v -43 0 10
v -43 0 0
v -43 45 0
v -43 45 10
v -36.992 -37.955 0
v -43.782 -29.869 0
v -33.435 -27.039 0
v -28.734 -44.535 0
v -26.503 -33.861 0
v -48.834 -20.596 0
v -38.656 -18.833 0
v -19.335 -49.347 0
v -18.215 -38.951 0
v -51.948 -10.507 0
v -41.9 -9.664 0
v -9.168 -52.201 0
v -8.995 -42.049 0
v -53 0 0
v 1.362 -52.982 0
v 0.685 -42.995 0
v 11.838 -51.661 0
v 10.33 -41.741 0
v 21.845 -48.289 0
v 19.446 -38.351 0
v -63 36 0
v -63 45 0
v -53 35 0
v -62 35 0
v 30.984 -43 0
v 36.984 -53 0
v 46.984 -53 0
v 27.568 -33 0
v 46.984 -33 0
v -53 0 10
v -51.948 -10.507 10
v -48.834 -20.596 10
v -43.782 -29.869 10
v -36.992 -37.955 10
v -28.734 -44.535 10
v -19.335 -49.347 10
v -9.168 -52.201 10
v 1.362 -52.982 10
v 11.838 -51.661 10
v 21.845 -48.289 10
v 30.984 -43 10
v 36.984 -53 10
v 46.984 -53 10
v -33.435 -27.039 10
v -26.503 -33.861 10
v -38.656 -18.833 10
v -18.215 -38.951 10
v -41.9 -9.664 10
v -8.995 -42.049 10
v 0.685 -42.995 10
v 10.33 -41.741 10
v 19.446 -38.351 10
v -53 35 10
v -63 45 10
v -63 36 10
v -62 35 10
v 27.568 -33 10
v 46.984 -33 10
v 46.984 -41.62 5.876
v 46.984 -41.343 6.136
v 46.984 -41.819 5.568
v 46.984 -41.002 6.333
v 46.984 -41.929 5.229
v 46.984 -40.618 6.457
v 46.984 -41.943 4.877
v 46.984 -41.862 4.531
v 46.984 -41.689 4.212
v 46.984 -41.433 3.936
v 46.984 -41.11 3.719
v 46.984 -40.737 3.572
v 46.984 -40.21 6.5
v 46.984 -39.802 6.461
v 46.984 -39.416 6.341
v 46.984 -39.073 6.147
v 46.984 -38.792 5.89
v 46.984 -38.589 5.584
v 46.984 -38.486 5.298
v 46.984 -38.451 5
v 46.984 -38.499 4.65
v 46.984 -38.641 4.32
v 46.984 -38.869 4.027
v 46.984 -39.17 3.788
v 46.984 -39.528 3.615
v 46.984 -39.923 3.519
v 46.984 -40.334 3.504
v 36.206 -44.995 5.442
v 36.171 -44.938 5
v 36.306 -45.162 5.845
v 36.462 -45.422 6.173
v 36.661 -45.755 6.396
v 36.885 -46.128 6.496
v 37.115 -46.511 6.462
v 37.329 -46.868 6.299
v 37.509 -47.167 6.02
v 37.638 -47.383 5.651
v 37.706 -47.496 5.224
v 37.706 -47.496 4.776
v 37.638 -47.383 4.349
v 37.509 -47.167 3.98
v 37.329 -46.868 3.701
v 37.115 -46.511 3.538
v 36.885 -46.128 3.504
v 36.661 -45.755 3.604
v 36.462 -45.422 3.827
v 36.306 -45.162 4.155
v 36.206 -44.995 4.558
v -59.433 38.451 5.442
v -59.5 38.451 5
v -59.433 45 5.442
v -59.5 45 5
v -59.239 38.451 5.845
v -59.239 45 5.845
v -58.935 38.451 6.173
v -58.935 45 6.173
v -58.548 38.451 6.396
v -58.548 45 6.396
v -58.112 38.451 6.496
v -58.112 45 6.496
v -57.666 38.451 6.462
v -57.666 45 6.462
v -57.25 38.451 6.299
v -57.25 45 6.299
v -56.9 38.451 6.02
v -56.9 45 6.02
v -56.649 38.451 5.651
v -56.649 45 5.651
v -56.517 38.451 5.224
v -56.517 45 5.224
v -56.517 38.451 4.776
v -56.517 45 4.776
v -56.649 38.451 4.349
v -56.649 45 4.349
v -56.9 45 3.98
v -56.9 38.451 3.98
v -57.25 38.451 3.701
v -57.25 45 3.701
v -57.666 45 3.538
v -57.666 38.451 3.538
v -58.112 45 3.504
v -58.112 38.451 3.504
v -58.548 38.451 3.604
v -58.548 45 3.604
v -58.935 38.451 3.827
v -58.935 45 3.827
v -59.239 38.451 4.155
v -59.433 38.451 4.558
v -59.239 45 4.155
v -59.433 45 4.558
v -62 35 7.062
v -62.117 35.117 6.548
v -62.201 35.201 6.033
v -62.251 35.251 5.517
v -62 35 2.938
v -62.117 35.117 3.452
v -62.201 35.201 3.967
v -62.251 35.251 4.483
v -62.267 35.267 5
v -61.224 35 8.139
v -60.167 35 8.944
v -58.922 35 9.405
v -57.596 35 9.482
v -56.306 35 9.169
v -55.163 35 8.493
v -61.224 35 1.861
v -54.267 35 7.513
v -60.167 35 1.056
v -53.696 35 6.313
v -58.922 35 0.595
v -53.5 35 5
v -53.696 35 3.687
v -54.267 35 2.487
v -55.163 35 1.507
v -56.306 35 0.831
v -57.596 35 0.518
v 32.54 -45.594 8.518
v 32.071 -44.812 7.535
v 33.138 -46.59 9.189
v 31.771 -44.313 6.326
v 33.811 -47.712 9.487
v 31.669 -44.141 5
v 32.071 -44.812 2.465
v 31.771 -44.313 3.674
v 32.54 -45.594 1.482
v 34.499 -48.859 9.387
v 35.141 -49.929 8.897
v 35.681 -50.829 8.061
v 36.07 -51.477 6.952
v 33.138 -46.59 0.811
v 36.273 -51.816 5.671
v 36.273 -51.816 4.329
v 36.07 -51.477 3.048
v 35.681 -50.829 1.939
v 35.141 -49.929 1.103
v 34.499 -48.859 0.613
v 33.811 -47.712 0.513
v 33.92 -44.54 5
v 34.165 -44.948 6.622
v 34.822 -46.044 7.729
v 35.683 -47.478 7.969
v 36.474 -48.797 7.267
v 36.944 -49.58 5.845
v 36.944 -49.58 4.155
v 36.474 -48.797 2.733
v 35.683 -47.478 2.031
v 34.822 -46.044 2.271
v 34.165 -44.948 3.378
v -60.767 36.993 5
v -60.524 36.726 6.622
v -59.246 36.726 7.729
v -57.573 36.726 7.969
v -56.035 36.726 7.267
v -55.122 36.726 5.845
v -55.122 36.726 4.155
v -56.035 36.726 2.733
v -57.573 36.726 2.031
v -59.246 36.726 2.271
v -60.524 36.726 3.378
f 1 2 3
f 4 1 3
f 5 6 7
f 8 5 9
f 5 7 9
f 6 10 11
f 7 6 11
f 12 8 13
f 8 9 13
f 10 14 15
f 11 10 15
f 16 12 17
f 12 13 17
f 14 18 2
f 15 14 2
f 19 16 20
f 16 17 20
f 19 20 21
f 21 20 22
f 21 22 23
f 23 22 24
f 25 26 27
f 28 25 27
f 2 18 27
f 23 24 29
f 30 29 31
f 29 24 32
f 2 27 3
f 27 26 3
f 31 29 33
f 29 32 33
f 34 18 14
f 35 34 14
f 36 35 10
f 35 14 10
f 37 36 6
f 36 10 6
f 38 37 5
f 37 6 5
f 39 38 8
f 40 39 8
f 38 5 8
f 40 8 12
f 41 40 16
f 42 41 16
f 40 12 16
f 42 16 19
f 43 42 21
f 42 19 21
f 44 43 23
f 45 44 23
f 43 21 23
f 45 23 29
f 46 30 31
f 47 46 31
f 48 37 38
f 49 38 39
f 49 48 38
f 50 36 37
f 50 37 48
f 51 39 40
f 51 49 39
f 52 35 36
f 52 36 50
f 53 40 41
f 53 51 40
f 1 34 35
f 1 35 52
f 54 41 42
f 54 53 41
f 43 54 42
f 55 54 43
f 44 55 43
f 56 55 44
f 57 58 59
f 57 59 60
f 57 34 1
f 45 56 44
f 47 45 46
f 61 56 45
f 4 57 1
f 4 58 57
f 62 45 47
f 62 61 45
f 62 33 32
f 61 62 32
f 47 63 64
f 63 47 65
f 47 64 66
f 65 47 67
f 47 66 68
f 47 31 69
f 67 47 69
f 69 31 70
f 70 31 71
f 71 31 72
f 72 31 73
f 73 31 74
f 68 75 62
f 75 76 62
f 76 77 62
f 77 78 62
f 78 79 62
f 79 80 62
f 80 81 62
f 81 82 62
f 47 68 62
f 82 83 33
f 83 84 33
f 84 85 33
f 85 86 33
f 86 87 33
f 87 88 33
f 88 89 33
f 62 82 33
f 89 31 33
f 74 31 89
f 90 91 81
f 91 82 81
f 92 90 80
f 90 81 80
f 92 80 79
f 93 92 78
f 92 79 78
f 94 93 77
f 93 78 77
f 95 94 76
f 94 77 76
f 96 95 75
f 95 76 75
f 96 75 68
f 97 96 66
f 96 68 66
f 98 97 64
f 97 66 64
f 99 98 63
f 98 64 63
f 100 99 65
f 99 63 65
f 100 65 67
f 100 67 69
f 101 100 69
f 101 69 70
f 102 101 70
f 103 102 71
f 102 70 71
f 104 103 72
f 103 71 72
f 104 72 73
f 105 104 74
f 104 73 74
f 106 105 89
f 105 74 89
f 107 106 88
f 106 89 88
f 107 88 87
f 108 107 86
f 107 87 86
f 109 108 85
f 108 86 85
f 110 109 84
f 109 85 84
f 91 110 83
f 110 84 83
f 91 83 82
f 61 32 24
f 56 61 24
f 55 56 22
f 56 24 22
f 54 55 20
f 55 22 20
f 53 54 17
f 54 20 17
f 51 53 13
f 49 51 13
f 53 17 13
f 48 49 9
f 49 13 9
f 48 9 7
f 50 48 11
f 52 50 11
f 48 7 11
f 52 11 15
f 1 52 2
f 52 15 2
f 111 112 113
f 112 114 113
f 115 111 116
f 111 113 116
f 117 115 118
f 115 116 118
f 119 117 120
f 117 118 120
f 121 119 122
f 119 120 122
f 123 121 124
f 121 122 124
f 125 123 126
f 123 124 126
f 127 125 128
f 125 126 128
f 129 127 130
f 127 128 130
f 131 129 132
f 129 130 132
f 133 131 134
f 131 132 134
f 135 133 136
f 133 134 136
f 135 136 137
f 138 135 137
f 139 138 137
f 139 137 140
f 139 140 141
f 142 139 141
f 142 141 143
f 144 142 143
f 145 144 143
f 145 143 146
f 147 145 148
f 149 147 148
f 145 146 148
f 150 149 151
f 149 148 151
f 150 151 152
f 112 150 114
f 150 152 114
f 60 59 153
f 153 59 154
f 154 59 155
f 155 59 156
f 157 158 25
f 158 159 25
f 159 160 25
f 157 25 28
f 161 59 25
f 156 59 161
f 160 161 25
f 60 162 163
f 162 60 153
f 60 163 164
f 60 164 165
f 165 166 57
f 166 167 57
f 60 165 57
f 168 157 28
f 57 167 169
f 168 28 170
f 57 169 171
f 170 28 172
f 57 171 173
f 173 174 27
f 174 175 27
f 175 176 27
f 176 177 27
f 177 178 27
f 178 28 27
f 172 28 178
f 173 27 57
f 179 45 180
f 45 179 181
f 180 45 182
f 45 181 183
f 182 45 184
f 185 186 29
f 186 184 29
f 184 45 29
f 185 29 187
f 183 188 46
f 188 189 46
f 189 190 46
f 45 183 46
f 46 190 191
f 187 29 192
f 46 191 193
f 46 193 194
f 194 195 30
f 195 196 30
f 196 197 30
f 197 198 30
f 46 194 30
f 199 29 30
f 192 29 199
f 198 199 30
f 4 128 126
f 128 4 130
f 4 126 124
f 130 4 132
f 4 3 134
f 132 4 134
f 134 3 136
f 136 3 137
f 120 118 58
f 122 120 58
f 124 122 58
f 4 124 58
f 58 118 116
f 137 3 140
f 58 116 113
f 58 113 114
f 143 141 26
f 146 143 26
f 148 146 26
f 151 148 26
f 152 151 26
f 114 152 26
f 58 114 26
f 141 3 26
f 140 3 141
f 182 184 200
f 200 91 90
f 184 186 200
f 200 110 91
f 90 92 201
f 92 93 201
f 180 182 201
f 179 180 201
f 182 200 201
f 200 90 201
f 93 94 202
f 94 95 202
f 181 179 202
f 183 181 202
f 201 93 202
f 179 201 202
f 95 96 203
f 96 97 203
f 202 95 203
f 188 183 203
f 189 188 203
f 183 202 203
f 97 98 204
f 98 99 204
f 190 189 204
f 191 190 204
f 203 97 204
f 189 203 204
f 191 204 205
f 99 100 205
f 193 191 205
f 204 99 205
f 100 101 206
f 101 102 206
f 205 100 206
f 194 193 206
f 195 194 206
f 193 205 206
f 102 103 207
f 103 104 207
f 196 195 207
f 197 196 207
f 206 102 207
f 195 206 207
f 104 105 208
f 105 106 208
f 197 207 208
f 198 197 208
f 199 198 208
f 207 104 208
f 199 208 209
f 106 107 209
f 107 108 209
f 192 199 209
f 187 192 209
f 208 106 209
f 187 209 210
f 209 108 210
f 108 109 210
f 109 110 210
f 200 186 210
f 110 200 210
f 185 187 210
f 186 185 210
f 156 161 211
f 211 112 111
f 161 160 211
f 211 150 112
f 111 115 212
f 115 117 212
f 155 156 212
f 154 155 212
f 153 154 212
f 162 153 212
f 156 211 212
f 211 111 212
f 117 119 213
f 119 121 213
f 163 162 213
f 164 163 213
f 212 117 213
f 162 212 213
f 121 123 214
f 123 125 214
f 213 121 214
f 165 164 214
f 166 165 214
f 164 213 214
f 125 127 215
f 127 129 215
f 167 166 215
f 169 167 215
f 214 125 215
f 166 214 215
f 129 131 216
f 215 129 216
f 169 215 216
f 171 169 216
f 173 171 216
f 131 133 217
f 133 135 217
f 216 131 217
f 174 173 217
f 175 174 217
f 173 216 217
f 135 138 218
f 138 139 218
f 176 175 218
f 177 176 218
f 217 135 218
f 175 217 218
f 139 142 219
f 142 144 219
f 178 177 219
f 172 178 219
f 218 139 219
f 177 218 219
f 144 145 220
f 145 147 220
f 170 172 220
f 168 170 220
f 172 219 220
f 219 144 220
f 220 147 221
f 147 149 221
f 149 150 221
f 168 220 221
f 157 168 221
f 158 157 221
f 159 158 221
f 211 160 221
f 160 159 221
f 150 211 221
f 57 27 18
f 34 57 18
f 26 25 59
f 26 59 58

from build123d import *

# Parameters (mm, degrees)
F0_W                 = 10
F0_H                 = 10
F1_DEPTH             = 10
F4_D                 = 3
F4_CSINK_D           = 9
F4_CSINK_ANGLE       = 82
F4_ON_F2_D           = 3
F4_ON_F2_CSINK_D     = 9
F4_ON_F2_CSINK_ANGLE = 82
F5_T1_DEPTH          = 15.1433659759


# Not quite as in the source:
# - a fillet or chamfer that OpenCascade refuses, or shapes differently, is made with other operations: its cross-section is extruded or revolved along the edge and cut away or added


with BuildPart() as f1:
    # F0 (on Top) → F1 (new body)
    with BuildSketch(Plane.XY):
        with BuildLine():
            ThreePointArc((27.5680975042, -33), (-18.2149911792, -38.9514325326), (-43, 0))
            Line((-43, 0), (-43, 45))
            Line((-43, 45), (-53, 45))
            Line((-53, 45), (-53, 35))
            Line((-53, 35), (-53, 0))
            ThreePointArc((-53, 0), (-24.154244567, -47.1759734335), (30.9838667697, -43))
            Line((30.9838667697, -43), (36.9838667697, -53))
            Line((36.9838667697, -53), (46.9838667697, -53))
            Line((46.9838667697, -53), (46.9838667697, -43))
            Line((46.9838667697, -43), (46.9838667697, -33))
            Line((46.9838667697, -33), (27.5680975042, -33))
        make_face()
        with Locations((-58, 40)):
            Rectangle(F0_W, F0_H)
    extrude(amount=F1_DEPTH)

    # F4 (through all)
    with Locations(Plane(origin=(3.8116667424, 2.2870000454, 0), x_dir=(0.5144957554, -0.8574929257, 0), z_dir=(-0.8574929257, -0.5144957554, 0))):
        with Locations((58.6442156402, 5)):
            CounterSinkHole(F4_D / 2, F4_CSINK_D / 2, counter_sink_angle=F4_CSINK_ANGLE)

    # F4 on F2 (through all)
    with Locations(Plane.XZ.offset(-35)):
        with Locations((-58, 5)):
            CounterSinkHole(F4_ON_F2_D / 2, F4_ON_F2_CSINK_D / 2, counter_sink_angle=F4_ON_F2_CSINK_ANGLE)

    # F5: chamfer of 1 on 1 edges, made by hand

    # F5_s2 → F5_t1 (cut)
    with BuildSketch(Plane.XY.offset(-2.571682988)):
        Polygon((-63, 36), (-62, 35), (-63, 35), align=None)
    extrude(amount=F5_T1_DEPTH, mode=Mode.SUBTRACT)


solid = f1.part
